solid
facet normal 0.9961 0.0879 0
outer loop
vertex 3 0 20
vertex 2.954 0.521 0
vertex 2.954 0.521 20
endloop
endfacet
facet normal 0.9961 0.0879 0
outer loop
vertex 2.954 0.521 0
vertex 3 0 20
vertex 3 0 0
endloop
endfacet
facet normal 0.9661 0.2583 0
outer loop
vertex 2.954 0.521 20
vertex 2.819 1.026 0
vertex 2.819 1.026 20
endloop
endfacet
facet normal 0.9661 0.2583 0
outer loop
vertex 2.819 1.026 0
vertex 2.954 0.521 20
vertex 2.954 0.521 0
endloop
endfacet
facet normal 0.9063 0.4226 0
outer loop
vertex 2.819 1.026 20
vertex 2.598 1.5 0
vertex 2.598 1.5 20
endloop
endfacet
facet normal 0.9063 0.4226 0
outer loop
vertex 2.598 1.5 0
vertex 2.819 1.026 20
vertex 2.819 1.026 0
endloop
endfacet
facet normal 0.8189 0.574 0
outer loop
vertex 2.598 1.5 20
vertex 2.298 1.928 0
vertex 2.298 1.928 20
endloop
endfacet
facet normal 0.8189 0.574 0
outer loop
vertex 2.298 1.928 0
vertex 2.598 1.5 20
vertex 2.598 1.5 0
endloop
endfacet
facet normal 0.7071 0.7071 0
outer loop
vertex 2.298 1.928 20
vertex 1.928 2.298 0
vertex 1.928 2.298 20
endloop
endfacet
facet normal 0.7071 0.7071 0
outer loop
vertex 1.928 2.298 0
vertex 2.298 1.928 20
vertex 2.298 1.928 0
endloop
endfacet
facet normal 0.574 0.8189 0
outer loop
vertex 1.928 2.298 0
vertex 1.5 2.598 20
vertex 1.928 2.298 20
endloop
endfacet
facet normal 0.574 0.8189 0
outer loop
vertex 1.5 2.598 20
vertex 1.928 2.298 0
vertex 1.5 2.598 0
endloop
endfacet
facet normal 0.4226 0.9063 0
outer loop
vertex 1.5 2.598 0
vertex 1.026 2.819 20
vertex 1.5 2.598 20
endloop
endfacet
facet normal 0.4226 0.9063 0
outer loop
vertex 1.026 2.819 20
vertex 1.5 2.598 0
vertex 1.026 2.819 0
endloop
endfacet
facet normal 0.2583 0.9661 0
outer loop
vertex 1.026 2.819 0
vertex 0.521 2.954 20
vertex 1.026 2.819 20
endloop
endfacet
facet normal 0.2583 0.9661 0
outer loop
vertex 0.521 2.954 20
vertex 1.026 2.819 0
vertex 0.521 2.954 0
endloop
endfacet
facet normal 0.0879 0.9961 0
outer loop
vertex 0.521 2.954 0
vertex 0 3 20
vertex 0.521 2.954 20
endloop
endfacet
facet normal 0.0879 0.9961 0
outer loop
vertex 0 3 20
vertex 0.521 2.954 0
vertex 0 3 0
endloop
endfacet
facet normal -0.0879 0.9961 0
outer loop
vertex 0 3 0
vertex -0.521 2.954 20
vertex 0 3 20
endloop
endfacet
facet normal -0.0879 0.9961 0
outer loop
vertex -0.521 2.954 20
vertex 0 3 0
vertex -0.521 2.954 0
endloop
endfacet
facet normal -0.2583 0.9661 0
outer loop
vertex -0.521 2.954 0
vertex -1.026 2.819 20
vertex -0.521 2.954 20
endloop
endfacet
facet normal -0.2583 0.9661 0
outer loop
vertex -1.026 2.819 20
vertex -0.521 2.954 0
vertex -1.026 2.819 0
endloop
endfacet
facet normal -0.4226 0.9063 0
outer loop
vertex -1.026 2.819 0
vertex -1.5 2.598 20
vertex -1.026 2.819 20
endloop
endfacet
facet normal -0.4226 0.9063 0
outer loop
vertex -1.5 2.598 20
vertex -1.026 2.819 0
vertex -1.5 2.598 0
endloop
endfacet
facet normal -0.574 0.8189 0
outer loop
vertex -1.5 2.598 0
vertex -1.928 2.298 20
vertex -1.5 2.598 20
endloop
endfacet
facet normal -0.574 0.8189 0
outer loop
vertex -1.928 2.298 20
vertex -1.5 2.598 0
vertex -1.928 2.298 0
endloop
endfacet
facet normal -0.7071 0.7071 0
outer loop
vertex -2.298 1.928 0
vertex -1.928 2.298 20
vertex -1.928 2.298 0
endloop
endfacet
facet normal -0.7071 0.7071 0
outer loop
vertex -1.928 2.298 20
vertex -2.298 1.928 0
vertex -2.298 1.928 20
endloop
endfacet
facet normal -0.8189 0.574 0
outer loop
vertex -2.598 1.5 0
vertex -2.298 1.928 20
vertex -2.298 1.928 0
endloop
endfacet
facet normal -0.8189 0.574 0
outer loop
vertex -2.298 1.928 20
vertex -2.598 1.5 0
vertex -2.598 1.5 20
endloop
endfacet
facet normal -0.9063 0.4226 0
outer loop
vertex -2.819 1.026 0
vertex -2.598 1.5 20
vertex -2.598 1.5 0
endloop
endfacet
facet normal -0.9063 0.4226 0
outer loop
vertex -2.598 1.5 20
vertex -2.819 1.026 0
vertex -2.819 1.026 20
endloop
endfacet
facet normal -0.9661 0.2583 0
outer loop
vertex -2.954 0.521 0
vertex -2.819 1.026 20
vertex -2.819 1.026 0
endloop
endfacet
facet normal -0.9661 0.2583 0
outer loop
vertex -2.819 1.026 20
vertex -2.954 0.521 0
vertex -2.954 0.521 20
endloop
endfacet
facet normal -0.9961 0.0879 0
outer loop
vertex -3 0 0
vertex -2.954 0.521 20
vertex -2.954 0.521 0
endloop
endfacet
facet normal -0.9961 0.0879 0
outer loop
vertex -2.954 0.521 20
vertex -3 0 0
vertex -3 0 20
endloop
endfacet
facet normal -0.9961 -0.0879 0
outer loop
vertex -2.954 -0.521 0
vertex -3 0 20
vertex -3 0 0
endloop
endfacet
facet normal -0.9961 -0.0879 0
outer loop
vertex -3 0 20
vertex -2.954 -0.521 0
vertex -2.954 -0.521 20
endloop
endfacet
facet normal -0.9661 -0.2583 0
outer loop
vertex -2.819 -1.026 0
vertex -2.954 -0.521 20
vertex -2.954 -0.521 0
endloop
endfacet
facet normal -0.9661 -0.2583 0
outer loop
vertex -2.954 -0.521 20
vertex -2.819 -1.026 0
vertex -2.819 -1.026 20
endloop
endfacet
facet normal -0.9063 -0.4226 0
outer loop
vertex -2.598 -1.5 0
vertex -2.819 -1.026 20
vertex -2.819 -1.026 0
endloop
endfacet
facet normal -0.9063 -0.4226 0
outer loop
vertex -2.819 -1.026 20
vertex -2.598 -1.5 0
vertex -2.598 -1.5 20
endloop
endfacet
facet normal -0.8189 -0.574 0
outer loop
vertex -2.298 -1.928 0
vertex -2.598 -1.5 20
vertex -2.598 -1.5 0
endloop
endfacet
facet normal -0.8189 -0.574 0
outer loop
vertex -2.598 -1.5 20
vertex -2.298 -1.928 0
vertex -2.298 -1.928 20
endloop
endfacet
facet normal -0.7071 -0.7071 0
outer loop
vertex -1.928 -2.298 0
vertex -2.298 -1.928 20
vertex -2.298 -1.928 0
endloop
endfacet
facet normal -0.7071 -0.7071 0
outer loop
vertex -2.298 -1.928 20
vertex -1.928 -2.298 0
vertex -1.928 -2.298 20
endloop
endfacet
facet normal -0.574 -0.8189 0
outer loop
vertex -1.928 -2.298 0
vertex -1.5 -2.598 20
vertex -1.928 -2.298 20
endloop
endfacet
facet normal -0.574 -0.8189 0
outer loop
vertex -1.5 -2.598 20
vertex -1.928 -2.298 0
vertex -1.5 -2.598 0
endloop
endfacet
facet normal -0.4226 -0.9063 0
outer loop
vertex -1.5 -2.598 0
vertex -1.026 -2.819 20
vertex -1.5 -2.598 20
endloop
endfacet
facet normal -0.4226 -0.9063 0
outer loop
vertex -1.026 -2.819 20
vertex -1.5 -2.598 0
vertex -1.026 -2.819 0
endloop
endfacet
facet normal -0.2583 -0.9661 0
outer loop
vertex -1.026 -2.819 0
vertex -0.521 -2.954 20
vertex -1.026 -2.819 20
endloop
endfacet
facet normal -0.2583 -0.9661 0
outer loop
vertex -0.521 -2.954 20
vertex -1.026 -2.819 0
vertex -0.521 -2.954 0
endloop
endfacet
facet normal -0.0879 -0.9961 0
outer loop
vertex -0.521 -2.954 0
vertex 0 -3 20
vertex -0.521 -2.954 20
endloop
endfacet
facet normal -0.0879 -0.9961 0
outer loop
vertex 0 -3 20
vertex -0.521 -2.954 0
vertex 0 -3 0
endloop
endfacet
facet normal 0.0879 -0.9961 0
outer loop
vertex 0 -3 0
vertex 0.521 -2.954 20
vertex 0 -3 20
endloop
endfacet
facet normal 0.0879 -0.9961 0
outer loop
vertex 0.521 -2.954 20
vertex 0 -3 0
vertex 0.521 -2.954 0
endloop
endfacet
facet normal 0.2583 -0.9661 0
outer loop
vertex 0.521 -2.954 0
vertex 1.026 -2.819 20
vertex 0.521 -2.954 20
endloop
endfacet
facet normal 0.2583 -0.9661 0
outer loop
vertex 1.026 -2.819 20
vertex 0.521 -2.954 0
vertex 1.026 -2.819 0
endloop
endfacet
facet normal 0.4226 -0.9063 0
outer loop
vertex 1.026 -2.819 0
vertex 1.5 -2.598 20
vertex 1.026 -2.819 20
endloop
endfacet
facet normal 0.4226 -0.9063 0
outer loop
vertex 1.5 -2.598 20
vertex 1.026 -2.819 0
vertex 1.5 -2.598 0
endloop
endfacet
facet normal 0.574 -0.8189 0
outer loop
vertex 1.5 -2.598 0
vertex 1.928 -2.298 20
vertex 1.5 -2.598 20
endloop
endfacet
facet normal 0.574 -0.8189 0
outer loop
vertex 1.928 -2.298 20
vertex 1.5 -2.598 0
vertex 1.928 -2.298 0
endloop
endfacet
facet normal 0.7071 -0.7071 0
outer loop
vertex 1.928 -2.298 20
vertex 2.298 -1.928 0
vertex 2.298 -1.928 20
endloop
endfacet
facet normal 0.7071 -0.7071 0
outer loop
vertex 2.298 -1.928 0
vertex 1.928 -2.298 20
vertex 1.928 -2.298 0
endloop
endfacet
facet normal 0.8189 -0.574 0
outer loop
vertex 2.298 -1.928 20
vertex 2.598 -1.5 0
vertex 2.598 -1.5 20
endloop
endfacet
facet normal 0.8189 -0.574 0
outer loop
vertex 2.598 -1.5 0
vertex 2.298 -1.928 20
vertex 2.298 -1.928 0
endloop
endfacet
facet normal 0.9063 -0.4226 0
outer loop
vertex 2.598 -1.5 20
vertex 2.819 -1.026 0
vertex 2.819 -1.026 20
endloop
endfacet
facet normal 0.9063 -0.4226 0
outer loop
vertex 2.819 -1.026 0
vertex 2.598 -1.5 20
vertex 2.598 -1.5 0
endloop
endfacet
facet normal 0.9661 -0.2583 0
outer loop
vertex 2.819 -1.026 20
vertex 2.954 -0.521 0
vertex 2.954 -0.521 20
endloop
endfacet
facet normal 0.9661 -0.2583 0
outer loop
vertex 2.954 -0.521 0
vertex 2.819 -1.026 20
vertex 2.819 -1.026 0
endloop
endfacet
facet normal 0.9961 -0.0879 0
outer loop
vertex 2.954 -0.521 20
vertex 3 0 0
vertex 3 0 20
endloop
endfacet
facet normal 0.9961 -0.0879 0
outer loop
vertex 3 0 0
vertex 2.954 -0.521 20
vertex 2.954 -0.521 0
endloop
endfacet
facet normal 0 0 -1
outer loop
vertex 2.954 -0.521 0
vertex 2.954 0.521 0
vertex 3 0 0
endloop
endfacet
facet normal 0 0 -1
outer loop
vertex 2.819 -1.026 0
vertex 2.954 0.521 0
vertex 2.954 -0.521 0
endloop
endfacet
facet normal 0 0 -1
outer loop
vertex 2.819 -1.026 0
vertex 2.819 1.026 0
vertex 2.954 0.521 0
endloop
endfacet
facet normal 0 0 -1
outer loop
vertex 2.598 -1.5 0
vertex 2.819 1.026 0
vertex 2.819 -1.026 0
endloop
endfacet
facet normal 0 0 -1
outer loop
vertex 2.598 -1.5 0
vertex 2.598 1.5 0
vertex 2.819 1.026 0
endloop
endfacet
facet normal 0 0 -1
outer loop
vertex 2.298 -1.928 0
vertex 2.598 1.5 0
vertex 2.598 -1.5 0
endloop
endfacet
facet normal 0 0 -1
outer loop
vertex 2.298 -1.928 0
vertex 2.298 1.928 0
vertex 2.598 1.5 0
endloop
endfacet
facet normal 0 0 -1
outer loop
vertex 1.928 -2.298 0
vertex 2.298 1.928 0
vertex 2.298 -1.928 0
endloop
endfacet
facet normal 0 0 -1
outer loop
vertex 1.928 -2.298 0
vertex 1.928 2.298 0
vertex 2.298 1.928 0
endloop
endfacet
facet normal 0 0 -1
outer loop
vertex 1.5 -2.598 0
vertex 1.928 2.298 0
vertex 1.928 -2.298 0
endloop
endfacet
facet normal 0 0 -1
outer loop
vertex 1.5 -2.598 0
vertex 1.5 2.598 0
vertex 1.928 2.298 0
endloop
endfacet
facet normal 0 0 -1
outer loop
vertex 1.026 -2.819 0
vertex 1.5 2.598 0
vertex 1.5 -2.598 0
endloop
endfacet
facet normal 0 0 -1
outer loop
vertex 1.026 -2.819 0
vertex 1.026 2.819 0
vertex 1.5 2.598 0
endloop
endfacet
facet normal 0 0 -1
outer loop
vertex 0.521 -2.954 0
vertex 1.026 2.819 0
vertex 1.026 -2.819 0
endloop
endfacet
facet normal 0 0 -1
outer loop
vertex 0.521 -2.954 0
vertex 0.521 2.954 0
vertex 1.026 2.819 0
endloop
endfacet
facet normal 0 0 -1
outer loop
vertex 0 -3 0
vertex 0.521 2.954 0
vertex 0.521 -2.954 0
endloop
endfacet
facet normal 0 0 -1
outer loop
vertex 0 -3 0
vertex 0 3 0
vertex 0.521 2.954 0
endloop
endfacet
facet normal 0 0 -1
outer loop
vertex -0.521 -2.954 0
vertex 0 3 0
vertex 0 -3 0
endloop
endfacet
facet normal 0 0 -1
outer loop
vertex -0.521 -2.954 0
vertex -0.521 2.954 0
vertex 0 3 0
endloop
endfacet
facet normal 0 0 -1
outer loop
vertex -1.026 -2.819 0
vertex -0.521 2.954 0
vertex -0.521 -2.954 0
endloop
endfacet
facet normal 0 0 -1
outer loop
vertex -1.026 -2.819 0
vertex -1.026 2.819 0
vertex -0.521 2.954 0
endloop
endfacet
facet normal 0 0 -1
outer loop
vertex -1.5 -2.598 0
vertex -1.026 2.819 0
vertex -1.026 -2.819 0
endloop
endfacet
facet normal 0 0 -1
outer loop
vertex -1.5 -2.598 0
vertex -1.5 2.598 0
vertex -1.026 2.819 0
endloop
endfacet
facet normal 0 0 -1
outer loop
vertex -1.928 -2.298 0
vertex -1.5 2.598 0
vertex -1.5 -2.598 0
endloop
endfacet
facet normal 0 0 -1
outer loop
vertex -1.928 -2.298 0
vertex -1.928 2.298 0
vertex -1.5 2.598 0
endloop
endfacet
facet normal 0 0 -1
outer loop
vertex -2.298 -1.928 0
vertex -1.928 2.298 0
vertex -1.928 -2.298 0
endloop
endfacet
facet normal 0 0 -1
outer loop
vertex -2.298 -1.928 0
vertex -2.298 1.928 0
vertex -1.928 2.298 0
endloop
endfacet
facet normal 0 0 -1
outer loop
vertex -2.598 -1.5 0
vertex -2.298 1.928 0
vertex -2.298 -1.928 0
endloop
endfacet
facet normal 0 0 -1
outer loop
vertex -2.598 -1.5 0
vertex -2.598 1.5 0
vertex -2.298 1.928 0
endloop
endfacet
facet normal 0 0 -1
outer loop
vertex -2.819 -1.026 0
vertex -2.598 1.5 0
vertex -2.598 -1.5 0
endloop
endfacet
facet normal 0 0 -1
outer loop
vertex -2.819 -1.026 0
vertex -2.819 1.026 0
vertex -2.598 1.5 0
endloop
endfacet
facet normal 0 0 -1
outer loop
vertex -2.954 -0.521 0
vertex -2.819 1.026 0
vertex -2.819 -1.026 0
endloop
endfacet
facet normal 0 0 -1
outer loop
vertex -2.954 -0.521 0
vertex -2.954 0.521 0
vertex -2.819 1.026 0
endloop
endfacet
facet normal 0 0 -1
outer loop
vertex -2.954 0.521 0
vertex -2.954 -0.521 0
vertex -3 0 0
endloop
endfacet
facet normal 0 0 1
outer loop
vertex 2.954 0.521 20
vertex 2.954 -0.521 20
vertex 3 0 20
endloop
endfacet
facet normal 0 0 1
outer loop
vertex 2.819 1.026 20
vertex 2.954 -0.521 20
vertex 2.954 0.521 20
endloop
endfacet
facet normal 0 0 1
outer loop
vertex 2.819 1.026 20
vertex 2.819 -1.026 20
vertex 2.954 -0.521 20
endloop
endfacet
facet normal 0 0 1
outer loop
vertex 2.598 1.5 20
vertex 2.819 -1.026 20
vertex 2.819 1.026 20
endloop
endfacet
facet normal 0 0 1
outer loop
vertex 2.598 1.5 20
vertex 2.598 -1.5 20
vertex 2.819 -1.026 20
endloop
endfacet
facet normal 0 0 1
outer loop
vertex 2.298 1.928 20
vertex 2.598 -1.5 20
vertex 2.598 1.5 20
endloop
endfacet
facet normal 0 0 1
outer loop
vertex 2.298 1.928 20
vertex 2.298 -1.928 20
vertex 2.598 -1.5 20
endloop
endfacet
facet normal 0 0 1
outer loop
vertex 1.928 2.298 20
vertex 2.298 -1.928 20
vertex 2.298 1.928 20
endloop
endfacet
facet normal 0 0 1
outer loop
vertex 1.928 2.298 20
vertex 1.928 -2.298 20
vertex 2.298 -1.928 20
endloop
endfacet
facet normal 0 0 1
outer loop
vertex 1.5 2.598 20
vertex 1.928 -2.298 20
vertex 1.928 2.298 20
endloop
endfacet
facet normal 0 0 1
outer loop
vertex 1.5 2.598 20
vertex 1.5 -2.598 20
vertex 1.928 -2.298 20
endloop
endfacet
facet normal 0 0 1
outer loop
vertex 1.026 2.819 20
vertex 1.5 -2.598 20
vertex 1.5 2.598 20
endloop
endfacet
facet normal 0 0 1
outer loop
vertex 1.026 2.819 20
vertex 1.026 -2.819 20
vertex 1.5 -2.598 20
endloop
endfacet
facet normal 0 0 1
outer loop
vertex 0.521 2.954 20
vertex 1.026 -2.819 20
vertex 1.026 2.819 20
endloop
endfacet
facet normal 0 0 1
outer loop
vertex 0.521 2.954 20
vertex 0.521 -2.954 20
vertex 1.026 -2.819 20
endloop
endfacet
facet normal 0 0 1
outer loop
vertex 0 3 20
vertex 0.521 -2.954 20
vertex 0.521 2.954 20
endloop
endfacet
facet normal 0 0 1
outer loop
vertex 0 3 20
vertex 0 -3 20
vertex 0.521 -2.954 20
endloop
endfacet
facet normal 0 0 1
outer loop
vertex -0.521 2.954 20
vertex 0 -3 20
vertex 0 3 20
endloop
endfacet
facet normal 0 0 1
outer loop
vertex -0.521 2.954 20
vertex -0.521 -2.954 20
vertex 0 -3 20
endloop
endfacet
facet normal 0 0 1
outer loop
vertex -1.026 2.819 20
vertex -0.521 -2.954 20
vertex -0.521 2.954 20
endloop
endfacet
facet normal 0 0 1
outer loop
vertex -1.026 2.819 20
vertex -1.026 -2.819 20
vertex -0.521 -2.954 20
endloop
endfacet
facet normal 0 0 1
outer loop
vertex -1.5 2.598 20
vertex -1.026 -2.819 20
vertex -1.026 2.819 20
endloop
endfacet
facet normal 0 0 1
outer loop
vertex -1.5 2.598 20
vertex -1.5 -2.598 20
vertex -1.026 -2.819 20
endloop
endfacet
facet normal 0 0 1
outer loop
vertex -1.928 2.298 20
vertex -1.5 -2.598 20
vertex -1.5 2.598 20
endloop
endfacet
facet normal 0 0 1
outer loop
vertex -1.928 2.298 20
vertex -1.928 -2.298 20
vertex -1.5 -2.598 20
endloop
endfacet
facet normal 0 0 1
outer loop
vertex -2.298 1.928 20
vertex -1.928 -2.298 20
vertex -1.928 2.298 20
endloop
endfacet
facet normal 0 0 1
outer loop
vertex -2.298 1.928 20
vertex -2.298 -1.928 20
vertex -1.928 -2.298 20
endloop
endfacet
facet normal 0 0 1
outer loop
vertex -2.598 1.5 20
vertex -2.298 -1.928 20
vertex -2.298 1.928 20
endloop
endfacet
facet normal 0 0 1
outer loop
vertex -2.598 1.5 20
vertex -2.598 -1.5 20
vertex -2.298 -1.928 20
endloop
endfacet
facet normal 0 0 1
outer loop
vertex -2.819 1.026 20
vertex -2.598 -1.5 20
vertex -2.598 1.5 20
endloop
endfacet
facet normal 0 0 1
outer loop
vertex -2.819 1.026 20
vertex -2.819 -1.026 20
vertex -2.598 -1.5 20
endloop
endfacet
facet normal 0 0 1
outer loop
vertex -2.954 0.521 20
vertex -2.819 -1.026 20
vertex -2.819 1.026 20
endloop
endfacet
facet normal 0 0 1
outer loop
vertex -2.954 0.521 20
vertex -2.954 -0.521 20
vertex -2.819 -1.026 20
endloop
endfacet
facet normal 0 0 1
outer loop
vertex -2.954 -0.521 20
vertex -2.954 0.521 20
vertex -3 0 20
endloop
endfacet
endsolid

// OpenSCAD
// file: ThreadBase.scad
function hex_cap_screw_dk(mSize) = lookup(
    mSize,
    [   [2,3.98],
        [2.5,4.68],
        [3,5.68],
        [4,7.22],
        [5,8.72],
        [6,10.22],
        [8,13.27],
        [10,16.27],
        [12,18.27]]);

function nut_s(mSize) = lookup(
    mSize,
    [   [ 2  , 4  ],
        [ 2.5, 5  ],
        [ 3  , 5.5],
        [ 4  , 7  ],
        [ 5  , 8  ],
        [ 6  ,10  ],
        [ 8  ,13  ],
        [10  ,17  ],
        [12  ,19  ]]);

function lock_nut_h(mSize) = lookup(
    mSize,
    [   [ 2  , 2.8],
        [ 2.5, 3  ],
        [ 3  , 3.9],
        [ 4  , 5  ],
        [ 5  , 5  ],
        [ 6  , 5.9],
        [ 8  , 7.9],
        [10  , 9.8],
        [12  ,12  ]]);

function nut_m(mSize) = lookup(
    mSize,
    [   [ 2  , 1.6],
        [ 2.5, 2  ],
        [ 3  , 2.4],
        [ 4  , 3.2],
        [ 5  , 4  ],
        [ 6  , 5  ],
        [ 8  , 6.5],
        [10  , 8  ],
        [12  ,10  ]]);

function bolt_s(mSize) = nut_s(mSize);


function bolt_k(mSize) = lookup(
    mSize,
    [   [ 3, 2.12],
        [ 4, 2.92],
        [ 5, 3.65],
        [ 6, 4.15],
        [ 8, 5.45],
        [10, 6.58],
        [12, 7.68]]);


function bolt_b(mSize, L) = let (
bolt_b_values = [   
    [ 3,[12]],
    [ 4,[14]],
    [ 5,[16,22]],
    [ 6,[18,24]],
    [ 8,[22,28]],
    [10,[26,32,45]],
    [12,[30,36,49]]]) bolt_b_values[search(mSize,bolt_b_values)[0]][1][L>200?2:(L>125?1:0)];

function pitch(mSize) = lookup(
    mSize,
    [   [2,0.4],
        [2.5,0.45],
        [3,0.5],
        [4,0.7],
        [5,0.8],
        [6,1],
        [8,1.25],
        [10,1.5],
        [12,1.75],
        [14,2],
        [16,2],
        [18,2.5],
        [20,2.5]]);

module nut_profile(mSize = 5, axis = "z", revDir = false)
{
    orient_to_axis(axis = axis, revDir = revDir)
    {
        d = nut_s(mSize)/sin(60);
        points = [for (a = [60:60:360]) d/2 * [cos(a), sin(a)]]; 
        polygon(points);
    }
}

inch = 25.4;

function bsp_tpi(iSize) = lookup(
    iSize,
    [   [1/16,28],
        [1/8,28],
        [1/4,19],
        [3/8,19],
        [1/2,14],
        [3/4,14],
        [1,11],
        [1.25,11],
        [1.5,11],
        [2,11],
        [2.5,11],
        [3,11],
        [4,11],
        [5,11],
        [6,11]]);

function bsp_pitch(iSize) = inch/bsp_tpi(iSize);

function bsp_d_major(iSize) = lookup(
    iSize,
    [   [1/16,7.723],
        [1/8,9.728],
        [1/4,13.157],
        [3/8,16.662],
        [1/2,20.995],
        [3/4,26.441],
        [1,33.249],
        [1.25,41.910],
        [1.5,47.803],
        [2,59.614],
        [2.5,75.184],
        [3,87.884],
        [4,113.03],
        [5,138.430],
        [6,163.830]]);

function bsp_h_v(iSize) = bsp_pitch(iSize)/(2*tan(55/2));

function bsp_h_basic(iSize) = 2*bsp_h_v(iSize)/3;

function bsp_d_minor(iSize) = bsp_d_major(iSize)-2*bsp_h_basic(iSize);

module orient_to_axis(axis = "x", revDir = false)
{
    if (axis=="x")
    {
        rotate(a = 90, v = [0,1,0]) orient_to_axis(axis = "z",revDir=revDir) {children();};
    }
    else if (axis=="y")
    {
        rotate(a = -90, v = [1,0,0]) orient_to_axis(axis = "z",revDir=revDir) {children();};
    }
    else if (axis=="z")
    {
        rotate(a = revDir ? 180 : 0, v = [1,0,0]) {children();}
    }
    else
    {
        assert(false,str("unknown axis ",axis));
    }
}
// main file
use <ThreadBase.scad>;

inch = 25.4;

function bsp_profile(iSize) = 
    let (h = bsp_h_basic(iSize), y = bsp_h_basic(iSize)*tan(55/2), p = bsp_pitch(iSize), d = bsp_d_major(iSize)) [
        [d/2-1.5*h,0],
        [d/2-h,0],
        [d/2-h,p/4-y/2],
        [d/2,p/4+y/2],
        [d/2,3*p/4-y/2],
        [d/2-h,3*p/4+y/2],
        [d/2-h,p],
        [d/2-1.5*h,p]
    ];

function metric_profile(d = 10, pitch = 1.5) = 
    let (h = pitch*sqrt(3)/2) [
        [d/2-5*h/8,pitch/8], 
        [d/2,7*pitch/16], 
        [d/2,9*pitch/16], 
        [d/2-5*h/8,7*pitch/8]
    ];

/*
function metric_profile(d = 10, pitch = 1.5) = 
    let (h = pitch*sqrt(3)/2) [
        [d/2-7*h/8,0],
        [d/2-5*h/8,0],
        [d/2-5*h/8,pitch/8], 
        [d/2,7*pitch/16], 
        [d/2,9*pitch/16], 
        [d/2-5*h/8,7*pitch/8],
        [d/2-5*h/8,pitch],
        [d/2-7*h/8,pitch]
    ];
*/

function metric_d_min(d = 10, pitch = 1.5) = d-sqrt(3)*5/8*pitch+0.1*pitch;

function fragments() = $fn < 18 ? 18 : $fn;

module thread_segment(threadProfilePolygon = metric_profile(), pitch = 2)
{
    for (v = threadProfilePolygon)
    {
        assert(v[0] > 0, "All points of thread profile polygon must have positive x values");
    }
    polPoints = len(threadProfilePolygon);
    assert(polPoints > 0, "Thread profile polygon must have at least 3 points");
    fn = fragments();
    faces = concat(
        [[for (j = [1:polPoints]) polPoints-j]], 
        [[for (j = [0:polPoints-1]) polPoints+j]],
        [for (j = [0:polPoints-1]) [j,(j+1) % polPoints,((j+1) % polPoints)+polPoints,j+polPoints]]);
    //multiplication by 1.001 ensures, that segments overlap by 0.1 % anglewise
    points = concat(
        [for (v = threadProfilePolygon) [v[0],0,v[1]]],
        [for (v = threadProfilePolygon) [cos(1.001*360/fn)*v[0],sin(1.001*360/fn)*v[0],v[1]+pitch/fn]]);
    polyhedron(faces = faces, points = points);    
}

*thread_segment($fn = 72);

module thread_extrude(threadProfilePolygon = metric_profile(), pitch = 1.5, angle = 720)
{
    if (angle > 360)
    {
        thread_extrude(threadProfilePolygon,pitch,360);
        translate([0,0,pitch]) {thread_extrude(threadProfilePolygon,pitch,angle-360);}
    }
    else
    {
        render()
        {
            fn = fragments();
            segmentCount = ceil(fn*angle/360);
            assert(segmentCount > 0, "Angle must be positive")

            for (i = [0:segmentCount-1])
            {
                rotate(a = i*360/fn) 
                {
                    translate([0,0,i*pitch/fn]) 
                    {
                        thread_segment(threadProfilePolygon = threadProfilePolygon, pitch = pitch);
                    }
                }
            }
        }
    }
}

module metric_thread(d = 10, pitch = 1.5, h = 15)
{
    assert(pitch!=0, "Pitch cannot be 0");
    assert(h > 0, "Height must be positive");
    intersection()
    {
        translate([0,0,-pitch]) {thread_extrude(metric_profile(d, pitch), pitch, 360*h/pitch+360);}
        cylinder(d = d, h = h);
    }
}

module bspp_thread(iSize = 1/4, h = 20)
{
    assert(h > 0, "Height must be positive");
    intersection()
    {
        pitch = bsp_pitch(iSize);
        translate([0,0,-pitch]) {thread_extrude(bsp_profile(iSize), pitch, 360*h/pitch+360);}
        cylinder(d = bsp_d_major(iSize), h = h);
    }
}

t8d2 = tan(30)/2;
t8d1 = 1/2-t8d2;

function t8_profile()= [
    [3,t8d1],
    [4,t8d1+2*t8d2],
    [4,3*t8d1+2*t8d2],
    [3,3*t8d1+4*t8d2]];


*translate([-3,0]) {polygon(t8_profile());}

module t8x8_thread(h = 20)
{
    assert(h > 0, "Height must be positive");
    pitch = 8;
    intersection()
    {
        for (a = [0:90:270])
        {
            rotate(a)
            {
                translate([0,0,-pitch]) {thread_extrude(t8_profile(), pitch, 360*h/pitch+360);}
            }
        }
        linear_extrude(h)
        {
            square([9,9],true);
        }
    }
}

cylinder(d = 6, h = 20, $fn = 36);
t8x8_thread($fn = 36);



*thread_extrude($fn = 36, angle = 3600);

*metric_thread(h = 3, $fn = 36);

*translate([0,0,20]) {metric_thread(pitch = -1.5, h = 3, $fn = 36);}
*difference()
{
    translate([0,0,-1]) {cylinder(d = 12, h = 6);}
    translate([0,0,-1]) {cylinder(d = 8, h = 7);}
    thread_extrude($fn = 36);
}

pitch = 1.5;
*for (i = [0:3])
{
    translate([0,0,i*pitch]) {render() {thread_extrude(pitch = pitch, angle = 360, $fn = 72);}}
}
